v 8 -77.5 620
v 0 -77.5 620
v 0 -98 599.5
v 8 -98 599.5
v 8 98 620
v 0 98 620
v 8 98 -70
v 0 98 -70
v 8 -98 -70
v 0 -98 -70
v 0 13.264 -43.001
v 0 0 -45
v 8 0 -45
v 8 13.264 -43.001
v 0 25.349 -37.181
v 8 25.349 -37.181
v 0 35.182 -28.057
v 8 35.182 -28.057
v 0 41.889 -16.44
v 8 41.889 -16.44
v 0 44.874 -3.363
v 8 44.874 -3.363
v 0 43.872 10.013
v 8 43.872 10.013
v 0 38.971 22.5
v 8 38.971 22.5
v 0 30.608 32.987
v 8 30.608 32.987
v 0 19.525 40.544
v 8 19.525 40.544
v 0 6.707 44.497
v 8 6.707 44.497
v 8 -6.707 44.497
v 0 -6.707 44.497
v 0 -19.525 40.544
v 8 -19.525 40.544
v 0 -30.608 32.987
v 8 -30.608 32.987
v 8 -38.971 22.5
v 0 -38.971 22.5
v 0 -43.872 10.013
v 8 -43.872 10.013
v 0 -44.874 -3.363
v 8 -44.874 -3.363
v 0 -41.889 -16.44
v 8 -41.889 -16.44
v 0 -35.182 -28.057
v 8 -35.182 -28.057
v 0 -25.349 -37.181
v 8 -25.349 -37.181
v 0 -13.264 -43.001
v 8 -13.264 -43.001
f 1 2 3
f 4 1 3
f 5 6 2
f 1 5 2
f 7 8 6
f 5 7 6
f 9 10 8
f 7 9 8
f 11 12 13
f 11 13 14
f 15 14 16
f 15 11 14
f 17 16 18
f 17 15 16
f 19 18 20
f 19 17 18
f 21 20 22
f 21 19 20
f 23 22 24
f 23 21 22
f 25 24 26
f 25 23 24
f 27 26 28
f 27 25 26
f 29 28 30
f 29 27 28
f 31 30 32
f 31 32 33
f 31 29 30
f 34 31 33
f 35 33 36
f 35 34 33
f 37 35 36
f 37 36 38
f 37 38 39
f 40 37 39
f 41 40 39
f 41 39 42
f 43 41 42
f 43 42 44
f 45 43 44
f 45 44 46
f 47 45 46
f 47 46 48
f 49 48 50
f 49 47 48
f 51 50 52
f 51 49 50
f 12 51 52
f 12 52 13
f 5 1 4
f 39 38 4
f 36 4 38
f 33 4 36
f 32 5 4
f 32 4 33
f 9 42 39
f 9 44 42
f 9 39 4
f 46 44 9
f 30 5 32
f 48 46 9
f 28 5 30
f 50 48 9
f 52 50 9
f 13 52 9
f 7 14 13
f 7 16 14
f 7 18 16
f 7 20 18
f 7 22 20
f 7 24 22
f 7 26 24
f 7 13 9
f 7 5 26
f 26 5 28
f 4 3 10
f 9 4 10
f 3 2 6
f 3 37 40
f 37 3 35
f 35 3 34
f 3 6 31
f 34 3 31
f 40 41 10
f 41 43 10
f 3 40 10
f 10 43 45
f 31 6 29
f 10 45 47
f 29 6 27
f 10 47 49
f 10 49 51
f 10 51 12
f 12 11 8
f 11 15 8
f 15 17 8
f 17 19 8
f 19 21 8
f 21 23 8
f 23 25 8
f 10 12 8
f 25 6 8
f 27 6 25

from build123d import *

# Parameters (mm, degrees)
SKETCH_1_R      = 45
EXTRUDE_1_DEPTH = 8


with BuildPart() as part:
    # 草图1 → 凸台-拉伸1 (new body)
    with BuildSketch(Plane(origin=(0, 0, 0), x_dir=(0, 0, -1), z_dir=(1, 0, 0))):
        Polygon((70, 98), (-620, 98), (-620, -77.5), (-599.5, -98), (70, -98), align=None)
        Circle(SKETCH_1_R, mode=Mode.SUBTRACT)
    extrude(amount=EXTRUDE_1_DEPTH)


solid = part.part
